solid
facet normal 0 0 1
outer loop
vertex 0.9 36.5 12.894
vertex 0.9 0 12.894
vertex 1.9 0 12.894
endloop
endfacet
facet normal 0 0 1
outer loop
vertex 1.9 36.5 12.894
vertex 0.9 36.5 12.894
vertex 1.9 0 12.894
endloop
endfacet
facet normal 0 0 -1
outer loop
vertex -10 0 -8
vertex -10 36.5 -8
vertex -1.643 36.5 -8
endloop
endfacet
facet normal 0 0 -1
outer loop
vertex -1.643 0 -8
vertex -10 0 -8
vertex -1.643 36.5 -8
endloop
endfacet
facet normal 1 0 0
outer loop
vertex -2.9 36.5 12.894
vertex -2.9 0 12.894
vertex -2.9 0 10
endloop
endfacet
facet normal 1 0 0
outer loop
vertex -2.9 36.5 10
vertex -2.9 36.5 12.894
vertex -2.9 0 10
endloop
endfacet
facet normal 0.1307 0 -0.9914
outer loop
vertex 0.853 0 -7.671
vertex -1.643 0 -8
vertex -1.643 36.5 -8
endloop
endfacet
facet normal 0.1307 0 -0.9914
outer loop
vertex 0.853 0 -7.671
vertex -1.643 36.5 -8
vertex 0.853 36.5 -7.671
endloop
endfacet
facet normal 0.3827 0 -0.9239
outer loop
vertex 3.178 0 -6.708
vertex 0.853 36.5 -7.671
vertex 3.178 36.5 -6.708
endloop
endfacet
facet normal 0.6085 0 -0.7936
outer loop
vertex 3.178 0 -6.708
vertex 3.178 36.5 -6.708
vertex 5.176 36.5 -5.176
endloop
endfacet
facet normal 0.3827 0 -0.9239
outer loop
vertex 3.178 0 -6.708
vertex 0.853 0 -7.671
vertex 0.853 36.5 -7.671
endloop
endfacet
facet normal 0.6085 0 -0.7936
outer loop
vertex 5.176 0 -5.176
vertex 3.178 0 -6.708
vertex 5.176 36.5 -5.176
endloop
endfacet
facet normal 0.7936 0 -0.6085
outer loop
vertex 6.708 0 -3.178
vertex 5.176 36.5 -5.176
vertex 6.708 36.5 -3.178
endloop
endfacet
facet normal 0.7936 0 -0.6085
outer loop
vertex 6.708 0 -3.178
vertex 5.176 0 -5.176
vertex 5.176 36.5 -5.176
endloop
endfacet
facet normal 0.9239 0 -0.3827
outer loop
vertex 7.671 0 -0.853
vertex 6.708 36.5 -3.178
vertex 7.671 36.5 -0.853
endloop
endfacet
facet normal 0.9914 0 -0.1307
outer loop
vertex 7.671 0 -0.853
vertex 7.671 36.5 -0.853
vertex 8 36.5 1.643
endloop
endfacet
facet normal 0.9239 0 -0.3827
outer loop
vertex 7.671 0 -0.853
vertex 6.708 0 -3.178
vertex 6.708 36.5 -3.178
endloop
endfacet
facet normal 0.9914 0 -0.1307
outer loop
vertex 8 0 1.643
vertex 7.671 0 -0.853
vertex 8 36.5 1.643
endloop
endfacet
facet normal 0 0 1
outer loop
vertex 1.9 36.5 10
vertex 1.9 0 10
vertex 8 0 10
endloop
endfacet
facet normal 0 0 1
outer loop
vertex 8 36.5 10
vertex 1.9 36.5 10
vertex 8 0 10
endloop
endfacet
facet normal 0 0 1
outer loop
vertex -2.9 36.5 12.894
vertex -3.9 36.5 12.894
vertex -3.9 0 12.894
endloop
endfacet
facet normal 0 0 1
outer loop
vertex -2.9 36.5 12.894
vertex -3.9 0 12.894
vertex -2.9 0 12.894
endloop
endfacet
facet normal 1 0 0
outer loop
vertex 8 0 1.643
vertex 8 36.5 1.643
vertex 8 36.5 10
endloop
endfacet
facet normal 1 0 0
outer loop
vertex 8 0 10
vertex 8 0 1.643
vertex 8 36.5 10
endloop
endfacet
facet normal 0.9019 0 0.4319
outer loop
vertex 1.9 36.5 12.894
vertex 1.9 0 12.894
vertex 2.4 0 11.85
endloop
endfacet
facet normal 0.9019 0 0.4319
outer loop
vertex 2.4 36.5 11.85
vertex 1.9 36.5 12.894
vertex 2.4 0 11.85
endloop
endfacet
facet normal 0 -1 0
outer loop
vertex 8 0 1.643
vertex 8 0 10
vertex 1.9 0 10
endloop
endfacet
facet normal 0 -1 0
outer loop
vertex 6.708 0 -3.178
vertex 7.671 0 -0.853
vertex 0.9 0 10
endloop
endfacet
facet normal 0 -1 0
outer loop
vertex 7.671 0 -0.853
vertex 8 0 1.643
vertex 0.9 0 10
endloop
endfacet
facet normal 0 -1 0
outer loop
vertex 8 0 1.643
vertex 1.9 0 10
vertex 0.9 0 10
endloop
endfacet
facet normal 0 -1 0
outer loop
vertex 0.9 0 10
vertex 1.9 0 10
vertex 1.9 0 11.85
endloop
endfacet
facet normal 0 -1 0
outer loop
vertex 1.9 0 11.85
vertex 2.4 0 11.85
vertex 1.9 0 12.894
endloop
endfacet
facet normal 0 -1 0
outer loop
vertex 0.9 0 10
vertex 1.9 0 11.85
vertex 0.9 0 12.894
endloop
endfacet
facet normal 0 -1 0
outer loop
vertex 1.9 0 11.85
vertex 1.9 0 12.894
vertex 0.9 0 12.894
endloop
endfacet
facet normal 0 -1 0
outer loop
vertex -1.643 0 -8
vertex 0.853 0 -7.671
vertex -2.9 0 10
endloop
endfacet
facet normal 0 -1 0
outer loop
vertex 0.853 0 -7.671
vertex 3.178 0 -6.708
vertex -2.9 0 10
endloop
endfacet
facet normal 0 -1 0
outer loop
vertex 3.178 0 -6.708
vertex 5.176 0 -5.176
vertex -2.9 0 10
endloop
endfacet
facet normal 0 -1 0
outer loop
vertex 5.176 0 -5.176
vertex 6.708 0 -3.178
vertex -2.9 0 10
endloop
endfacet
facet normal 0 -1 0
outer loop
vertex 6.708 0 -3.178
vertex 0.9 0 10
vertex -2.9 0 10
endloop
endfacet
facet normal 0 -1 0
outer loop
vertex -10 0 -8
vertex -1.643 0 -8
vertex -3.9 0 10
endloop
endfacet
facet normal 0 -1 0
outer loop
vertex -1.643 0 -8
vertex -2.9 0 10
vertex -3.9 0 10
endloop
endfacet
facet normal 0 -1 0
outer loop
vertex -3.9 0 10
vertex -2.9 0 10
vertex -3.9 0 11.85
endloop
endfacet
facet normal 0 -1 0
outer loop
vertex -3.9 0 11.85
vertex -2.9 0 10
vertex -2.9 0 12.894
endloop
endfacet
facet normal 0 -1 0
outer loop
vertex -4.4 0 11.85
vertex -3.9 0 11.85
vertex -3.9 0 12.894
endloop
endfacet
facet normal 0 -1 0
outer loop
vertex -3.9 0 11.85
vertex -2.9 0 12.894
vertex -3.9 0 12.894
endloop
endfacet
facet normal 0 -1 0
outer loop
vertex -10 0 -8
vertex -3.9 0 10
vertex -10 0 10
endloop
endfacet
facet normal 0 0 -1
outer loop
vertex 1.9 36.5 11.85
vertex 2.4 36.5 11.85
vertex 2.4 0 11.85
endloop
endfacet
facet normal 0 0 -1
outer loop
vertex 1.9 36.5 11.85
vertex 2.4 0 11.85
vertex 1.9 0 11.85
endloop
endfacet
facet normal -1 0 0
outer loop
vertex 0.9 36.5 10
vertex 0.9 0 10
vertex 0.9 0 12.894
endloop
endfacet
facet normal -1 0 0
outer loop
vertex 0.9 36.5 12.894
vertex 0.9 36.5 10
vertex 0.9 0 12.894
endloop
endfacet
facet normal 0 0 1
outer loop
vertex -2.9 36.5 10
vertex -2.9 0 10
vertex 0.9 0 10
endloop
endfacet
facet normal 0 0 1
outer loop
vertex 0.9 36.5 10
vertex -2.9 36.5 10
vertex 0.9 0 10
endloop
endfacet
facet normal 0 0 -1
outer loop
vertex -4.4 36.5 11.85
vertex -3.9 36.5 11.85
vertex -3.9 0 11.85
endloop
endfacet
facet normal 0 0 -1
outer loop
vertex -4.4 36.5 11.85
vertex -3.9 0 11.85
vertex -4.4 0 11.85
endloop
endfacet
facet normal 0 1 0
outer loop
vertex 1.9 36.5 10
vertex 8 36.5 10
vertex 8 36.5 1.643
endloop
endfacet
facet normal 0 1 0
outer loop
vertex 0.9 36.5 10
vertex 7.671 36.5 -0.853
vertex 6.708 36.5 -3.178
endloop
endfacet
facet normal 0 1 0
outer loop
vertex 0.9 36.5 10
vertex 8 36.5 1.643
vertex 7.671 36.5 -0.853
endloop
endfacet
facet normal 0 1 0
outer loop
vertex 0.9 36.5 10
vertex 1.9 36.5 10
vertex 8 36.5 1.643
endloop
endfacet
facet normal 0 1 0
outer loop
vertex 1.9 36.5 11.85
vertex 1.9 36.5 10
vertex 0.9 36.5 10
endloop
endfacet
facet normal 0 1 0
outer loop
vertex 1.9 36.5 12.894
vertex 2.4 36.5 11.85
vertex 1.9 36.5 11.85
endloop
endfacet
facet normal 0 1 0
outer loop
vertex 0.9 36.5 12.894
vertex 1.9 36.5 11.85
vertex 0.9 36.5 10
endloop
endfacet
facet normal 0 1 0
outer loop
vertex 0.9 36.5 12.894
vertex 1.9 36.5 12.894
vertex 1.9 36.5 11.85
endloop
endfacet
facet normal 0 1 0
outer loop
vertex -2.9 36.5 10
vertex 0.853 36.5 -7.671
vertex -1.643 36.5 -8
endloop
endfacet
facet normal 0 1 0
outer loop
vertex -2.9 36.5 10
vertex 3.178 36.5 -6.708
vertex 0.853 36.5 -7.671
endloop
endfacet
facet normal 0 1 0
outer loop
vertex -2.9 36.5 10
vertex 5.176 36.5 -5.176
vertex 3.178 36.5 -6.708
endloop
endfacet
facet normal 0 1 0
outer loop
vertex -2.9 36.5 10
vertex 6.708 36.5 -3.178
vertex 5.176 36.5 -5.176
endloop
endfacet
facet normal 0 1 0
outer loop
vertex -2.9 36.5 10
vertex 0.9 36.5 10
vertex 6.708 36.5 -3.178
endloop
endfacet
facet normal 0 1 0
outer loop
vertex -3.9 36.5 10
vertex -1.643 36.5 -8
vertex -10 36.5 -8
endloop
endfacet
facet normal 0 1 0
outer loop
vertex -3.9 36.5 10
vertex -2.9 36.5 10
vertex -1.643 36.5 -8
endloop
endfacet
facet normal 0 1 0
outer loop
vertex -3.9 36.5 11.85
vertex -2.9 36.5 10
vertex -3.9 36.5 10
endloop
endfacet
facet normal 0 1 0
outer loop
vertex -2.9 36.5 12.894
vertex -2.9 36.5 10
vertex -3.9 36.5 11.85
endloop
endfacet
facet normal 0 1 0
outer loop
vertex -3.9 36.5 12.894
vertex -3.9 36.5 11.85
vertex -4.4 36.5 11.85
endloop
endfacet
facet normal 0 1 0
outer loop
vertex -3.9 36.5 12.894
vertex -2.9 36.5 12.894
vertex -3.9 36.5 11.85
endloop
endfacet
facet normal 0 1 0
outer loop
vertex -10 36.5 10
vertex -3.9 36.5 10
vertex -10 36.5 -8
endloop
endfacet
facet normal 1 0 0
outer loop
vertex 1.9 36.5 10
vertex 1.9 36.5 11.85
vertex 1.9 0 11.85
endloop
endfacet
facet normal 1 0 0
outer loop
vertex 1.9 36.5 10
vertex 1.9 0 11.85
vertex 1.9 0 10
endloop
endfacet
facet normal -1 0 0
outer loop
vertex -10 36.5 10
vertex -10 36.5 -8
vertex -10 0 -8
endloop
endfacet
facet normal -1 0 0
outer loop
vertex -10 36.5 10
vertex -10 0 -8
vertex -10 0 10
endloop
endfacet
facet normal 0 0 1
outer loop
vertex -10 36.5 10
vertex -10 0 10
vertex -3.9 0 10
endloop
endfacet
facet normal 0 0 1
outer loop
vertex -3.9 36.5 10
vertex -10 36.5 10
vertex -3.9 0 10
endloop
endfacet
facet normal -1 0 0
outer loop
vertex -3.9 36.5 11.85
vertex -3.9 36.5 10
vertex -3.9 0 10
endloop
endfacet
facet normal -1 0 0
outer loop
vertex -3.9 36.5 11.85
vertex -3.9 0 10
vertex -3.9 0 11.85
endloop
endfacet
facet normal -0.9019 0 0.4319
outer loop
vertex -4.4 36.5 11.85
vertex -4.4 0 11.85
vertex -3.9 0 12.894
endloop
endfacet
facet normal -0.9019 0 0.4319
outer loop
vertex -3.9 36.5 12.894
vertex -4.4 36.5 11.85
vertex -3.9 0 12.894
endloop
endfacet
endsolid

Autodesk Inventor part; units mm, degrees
ref_plane "YZ Plane" through (0, 0, 0) normal (1, 0, 0) x (0, 1, 0)
ref_plane "XZ Plane" through (0, 0, 0) normal (0, 1, 0) x (-1, 0, 0)
ref_plane "XY Plane" through (0, 0, 0) normal (0, 0, 1) x (1, 0, 0)
sketch "Skizze1" plane through (0, 0, 0) normal (0, 1, 0) x (-1, 0, 0)
  line L0 (10, 10) -> (-10, 10)
  line L1 (-10, 10) -> (-10, -10)
  line L2 (-10, -10) -> (10, -10)
  line L3 (10, -10) -> (10, 10)
  line L4 (10, 10) -> (-10, -10) construction
  line L5 (-10, 10) -> (10, -10) construction
  point P0 (0, 0)
  dimension "d0" = 20
  dimension "d1" = 20
extrude "Extrusion1" add sketch "Skizze1" along normal blind 34.5
sketch "Skizze2" plane through (0, 0, 0) normal (0, -1, 0) x (1, 0, 0)
  line L0 (-8.9654, -8) -> (-1.6431, -8)
  line L1 (8, 1.6431) -> (8, 9.2)
  line L2 (-10, 10) -> (10, 10)
  line L3 (-10, -10) -> (-10, 10)
  line L4 (8, 10) -> (-10, 10)
  line L5 (-10, 10) -> (-10, -8)
  line L6 (-10, -8) -> (8, -8)
  line L7 (8, -8) -> (8, 10)
  line L8 (10, 10) -> (10, -10)
  line L9 (-10, 10) -> (10, 10)
  line L10 (-10, -10) -> (-10, 10)
  line L11 (10, -10) -> (-10, -10)
  circle A0 centre (-1.6431, 1.6431) radius 9.6431
  point P0 (0, 0)
extrude "Extrusion2" cut sketch "Skizze2" against normal through all contours L0 L6 L7 L1 L2 L8 L11 L3 | A0 L7 L6
sketch "Skizze3" plane through (0, 34.5, 0) normal (0, 1, 0) x (1, 0, 0)
  line L0 (0.9, -9.6) -> (0.9, -12.8936) projected
  line L1 (0.9, -12.8936) -> (1.9, -12.8936) projected
  line L2 (1.9, -12.8936) -> (2.4, -11.85) projected
  line L3 (2.4, -11.85) -> (1.9, -11.85) projected
  line L4 (1.9, -12.8936) -> (1.9, -9.6) projected
  line L5 (-2.9, -12.8936) -> (-2.9, -9.6) projected
  line L6 (-3.9, -9.6) -> (-3.9, -12.8936) projected
  line L7 (-3.9, -11.85) -> (-4.4, -11.85) projected
  line L8 (-4.4, -11.85) -> (-3.9, -12.8936) projected
  line L9 (-3.9, -12.8936) -> (-2.9, -12.8936) projected
  line L10 (0.9, -12.8936) -> (1.9, -12.8936)
  line L11 (1.9, -12.8936) -> (1.9, -9.6)
  line L12 (1.9, -9.6) -> (0.9, -9.6)
  line L13 (0.9, -9.6) -> (0.9, -12.8936)
  line L14 (-2.9, -12.8936) -> (-3.9, -12.8936)
  line L15 (-3.9, -12.8936) -> (-3.9, -9.6)
  line L16 (-3.9, -9.6) -> (-2.9, -9.6)
  line L17 (-2.9, -9.6) -> (-2.9, -12.8936)
  point P0 (0, 0)
extrude "Extrusion3" add sketch "Skizze3" against normal up to surface (34.5 mm away)
move faces "Verschieben1" translate (0, 2, 0) faces at (-5.181, 34.5, -2)
properties part number "Blank"
